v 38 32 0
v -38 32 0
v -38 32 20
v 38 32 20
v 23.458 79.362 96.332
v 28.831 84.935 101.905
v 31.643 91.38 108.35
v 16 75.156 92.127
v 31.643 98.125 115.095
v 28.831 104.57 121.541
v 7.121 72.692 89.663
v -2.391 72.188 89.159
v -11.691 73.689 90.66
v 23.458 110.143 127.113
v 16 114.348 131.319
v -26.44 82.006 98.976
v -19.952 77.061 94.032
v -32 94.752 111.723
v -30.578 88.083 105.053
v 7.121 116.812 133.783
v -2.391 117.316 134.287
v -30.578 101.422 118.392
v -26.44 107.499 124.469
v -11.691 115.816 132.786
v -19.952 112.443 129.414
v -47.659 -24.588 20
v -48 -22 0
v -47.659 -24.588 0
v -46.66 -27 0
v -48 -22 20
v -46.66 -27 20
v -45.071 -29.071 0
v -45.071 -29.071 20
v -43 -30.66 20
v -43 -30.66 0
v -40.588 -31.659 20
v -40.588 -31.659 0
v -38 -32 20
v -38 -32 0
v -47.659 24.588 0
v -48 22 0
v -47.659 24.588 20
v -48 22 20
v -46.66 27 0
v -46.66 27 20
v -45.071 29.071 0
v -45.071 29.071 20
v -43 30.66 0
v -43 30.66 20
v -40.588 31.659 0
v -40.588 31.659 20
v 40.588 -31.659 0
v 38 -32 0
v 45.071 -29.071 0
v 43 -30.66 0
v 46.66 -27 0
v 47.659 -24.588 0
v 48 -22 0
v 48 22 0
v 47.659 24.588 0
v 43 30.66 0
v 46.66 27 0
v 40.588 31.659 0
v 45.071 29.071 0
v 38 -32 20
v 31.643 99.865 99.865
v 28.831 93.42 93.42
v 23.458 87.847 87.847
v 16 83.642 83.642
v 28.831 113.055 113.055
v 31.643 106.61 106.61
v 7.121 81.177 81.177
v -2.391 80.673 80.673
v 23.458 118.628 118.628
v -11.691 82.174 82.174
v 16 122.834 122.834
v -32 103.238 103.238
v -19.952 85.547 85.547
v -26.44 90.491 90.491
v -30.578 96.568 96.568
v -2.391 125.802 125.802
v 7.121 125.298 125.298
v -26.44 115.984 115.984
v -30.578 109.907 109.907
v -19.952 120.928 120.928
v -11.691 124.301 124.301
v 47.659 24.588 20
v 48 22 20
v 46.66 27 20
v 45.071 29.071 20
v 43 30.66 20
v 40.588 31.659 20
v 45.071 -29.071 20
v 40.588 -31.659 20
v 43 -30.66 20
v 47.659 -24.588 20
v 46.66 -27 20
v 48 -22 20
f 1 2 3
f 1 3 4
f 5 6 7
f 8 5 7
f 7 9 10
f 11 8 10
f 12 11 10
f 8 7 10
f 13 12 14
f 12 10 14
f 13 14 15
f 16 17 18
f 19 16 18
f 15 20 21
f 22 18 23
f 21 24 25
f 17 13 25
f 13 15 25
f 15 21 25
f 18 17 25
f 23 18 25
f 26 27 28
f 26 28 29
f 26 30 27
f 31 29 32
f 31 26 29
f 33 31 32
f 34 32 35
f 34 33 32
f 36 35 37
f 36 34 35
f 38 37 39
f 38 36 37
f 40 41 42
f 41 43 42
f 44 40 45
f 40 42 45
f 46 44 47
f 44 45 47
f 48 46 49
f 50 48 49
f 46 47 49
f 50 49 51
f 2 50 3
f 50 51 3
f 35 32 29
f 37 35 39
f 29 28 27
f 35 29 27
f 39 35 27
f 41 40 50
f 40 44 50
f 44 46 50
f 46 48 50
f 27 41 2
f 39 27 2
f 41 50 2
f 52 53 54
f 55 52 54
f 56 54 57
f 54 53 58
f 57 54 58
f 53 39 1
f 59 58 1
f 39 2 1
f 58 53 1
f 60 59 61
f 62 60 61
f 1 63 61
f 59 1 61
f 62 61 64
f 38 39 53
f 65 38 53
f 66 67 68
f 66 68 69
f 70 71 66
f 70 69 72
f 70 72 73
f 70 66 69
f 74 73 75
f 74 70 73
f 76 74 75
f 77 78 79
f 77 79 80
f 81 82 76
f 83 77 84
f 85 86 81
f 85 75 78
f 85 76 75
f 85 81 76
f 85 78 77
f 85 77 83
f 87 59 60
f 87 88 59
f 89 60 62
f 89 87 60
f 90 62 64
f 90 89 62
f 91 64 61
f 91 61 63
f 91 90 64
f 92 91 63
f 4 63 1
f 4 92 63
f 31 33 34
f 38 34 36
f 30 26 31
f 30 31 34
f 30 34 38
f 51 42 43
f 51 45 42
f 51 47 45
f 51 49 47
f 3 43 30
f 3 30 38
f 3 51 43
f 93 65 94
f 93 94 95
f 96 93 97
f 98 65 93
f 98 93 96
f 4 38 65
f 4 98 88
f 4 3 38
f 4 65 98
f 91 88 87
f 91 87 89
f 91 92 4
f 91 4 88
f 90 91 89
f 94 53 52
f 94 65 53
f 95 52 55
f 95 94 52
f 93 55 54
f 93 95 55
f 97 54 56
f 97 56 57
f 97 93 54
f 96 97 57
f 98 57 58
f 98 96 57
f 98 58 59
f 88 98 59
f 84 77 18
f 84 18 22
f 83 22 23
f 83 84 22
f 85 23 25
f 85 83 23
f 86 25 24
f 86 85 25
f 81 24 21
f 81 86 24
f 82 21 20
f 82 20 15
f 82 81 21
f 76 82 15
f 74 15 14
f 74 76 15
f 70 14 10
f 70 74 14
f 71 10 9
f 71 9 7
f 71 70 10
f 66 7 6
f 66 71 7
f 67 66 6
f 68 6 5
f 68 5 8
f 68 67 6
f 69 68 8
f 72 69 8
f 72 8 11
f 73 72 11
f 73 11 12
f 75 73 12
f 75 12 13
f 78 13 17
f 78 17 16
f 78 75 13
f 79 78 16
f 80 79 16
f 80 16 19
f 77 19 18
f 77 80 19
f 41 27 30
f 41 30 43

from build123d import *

# Parameters (mm, degrees)
F0_W     = 96
F0_H     = 64
F1_DEPTH = 20
F2_R     = 10
F5_R     = 32
F6_DEPTH = 12


with BuildPart() as f1:
    # F0 (on Top) → F1 (new body)
    with BuildSketch(Plane.XY):
        Rectangle(F0_W, F0_H)
    extrude(amount=F1_DEPTH)

    # F2
    f2_edges = [f1.edges().sort_by_distance(p)[0] for p in [
        (-48, -32, 10),
        (48, -32, 10),
        (48, 32, 10),
        (-48, 32, 10),
    ]]
    fillet(f2_edges, radius=F2_R)


with BuildPart() as f6:
    # F5 (on face) → F6 (new body)
    with BuildSketch(Plane(origin=(0, 0, 0), x_dir=(-1, 0, 0), z_dir=(0, 0.707107, -0.707107))):
        with Locations((0, 146)):
            Circle(F5_R)
    extrude(amount=-F6_DEPTH)


solid = Compound([f1.part, f6.part])
